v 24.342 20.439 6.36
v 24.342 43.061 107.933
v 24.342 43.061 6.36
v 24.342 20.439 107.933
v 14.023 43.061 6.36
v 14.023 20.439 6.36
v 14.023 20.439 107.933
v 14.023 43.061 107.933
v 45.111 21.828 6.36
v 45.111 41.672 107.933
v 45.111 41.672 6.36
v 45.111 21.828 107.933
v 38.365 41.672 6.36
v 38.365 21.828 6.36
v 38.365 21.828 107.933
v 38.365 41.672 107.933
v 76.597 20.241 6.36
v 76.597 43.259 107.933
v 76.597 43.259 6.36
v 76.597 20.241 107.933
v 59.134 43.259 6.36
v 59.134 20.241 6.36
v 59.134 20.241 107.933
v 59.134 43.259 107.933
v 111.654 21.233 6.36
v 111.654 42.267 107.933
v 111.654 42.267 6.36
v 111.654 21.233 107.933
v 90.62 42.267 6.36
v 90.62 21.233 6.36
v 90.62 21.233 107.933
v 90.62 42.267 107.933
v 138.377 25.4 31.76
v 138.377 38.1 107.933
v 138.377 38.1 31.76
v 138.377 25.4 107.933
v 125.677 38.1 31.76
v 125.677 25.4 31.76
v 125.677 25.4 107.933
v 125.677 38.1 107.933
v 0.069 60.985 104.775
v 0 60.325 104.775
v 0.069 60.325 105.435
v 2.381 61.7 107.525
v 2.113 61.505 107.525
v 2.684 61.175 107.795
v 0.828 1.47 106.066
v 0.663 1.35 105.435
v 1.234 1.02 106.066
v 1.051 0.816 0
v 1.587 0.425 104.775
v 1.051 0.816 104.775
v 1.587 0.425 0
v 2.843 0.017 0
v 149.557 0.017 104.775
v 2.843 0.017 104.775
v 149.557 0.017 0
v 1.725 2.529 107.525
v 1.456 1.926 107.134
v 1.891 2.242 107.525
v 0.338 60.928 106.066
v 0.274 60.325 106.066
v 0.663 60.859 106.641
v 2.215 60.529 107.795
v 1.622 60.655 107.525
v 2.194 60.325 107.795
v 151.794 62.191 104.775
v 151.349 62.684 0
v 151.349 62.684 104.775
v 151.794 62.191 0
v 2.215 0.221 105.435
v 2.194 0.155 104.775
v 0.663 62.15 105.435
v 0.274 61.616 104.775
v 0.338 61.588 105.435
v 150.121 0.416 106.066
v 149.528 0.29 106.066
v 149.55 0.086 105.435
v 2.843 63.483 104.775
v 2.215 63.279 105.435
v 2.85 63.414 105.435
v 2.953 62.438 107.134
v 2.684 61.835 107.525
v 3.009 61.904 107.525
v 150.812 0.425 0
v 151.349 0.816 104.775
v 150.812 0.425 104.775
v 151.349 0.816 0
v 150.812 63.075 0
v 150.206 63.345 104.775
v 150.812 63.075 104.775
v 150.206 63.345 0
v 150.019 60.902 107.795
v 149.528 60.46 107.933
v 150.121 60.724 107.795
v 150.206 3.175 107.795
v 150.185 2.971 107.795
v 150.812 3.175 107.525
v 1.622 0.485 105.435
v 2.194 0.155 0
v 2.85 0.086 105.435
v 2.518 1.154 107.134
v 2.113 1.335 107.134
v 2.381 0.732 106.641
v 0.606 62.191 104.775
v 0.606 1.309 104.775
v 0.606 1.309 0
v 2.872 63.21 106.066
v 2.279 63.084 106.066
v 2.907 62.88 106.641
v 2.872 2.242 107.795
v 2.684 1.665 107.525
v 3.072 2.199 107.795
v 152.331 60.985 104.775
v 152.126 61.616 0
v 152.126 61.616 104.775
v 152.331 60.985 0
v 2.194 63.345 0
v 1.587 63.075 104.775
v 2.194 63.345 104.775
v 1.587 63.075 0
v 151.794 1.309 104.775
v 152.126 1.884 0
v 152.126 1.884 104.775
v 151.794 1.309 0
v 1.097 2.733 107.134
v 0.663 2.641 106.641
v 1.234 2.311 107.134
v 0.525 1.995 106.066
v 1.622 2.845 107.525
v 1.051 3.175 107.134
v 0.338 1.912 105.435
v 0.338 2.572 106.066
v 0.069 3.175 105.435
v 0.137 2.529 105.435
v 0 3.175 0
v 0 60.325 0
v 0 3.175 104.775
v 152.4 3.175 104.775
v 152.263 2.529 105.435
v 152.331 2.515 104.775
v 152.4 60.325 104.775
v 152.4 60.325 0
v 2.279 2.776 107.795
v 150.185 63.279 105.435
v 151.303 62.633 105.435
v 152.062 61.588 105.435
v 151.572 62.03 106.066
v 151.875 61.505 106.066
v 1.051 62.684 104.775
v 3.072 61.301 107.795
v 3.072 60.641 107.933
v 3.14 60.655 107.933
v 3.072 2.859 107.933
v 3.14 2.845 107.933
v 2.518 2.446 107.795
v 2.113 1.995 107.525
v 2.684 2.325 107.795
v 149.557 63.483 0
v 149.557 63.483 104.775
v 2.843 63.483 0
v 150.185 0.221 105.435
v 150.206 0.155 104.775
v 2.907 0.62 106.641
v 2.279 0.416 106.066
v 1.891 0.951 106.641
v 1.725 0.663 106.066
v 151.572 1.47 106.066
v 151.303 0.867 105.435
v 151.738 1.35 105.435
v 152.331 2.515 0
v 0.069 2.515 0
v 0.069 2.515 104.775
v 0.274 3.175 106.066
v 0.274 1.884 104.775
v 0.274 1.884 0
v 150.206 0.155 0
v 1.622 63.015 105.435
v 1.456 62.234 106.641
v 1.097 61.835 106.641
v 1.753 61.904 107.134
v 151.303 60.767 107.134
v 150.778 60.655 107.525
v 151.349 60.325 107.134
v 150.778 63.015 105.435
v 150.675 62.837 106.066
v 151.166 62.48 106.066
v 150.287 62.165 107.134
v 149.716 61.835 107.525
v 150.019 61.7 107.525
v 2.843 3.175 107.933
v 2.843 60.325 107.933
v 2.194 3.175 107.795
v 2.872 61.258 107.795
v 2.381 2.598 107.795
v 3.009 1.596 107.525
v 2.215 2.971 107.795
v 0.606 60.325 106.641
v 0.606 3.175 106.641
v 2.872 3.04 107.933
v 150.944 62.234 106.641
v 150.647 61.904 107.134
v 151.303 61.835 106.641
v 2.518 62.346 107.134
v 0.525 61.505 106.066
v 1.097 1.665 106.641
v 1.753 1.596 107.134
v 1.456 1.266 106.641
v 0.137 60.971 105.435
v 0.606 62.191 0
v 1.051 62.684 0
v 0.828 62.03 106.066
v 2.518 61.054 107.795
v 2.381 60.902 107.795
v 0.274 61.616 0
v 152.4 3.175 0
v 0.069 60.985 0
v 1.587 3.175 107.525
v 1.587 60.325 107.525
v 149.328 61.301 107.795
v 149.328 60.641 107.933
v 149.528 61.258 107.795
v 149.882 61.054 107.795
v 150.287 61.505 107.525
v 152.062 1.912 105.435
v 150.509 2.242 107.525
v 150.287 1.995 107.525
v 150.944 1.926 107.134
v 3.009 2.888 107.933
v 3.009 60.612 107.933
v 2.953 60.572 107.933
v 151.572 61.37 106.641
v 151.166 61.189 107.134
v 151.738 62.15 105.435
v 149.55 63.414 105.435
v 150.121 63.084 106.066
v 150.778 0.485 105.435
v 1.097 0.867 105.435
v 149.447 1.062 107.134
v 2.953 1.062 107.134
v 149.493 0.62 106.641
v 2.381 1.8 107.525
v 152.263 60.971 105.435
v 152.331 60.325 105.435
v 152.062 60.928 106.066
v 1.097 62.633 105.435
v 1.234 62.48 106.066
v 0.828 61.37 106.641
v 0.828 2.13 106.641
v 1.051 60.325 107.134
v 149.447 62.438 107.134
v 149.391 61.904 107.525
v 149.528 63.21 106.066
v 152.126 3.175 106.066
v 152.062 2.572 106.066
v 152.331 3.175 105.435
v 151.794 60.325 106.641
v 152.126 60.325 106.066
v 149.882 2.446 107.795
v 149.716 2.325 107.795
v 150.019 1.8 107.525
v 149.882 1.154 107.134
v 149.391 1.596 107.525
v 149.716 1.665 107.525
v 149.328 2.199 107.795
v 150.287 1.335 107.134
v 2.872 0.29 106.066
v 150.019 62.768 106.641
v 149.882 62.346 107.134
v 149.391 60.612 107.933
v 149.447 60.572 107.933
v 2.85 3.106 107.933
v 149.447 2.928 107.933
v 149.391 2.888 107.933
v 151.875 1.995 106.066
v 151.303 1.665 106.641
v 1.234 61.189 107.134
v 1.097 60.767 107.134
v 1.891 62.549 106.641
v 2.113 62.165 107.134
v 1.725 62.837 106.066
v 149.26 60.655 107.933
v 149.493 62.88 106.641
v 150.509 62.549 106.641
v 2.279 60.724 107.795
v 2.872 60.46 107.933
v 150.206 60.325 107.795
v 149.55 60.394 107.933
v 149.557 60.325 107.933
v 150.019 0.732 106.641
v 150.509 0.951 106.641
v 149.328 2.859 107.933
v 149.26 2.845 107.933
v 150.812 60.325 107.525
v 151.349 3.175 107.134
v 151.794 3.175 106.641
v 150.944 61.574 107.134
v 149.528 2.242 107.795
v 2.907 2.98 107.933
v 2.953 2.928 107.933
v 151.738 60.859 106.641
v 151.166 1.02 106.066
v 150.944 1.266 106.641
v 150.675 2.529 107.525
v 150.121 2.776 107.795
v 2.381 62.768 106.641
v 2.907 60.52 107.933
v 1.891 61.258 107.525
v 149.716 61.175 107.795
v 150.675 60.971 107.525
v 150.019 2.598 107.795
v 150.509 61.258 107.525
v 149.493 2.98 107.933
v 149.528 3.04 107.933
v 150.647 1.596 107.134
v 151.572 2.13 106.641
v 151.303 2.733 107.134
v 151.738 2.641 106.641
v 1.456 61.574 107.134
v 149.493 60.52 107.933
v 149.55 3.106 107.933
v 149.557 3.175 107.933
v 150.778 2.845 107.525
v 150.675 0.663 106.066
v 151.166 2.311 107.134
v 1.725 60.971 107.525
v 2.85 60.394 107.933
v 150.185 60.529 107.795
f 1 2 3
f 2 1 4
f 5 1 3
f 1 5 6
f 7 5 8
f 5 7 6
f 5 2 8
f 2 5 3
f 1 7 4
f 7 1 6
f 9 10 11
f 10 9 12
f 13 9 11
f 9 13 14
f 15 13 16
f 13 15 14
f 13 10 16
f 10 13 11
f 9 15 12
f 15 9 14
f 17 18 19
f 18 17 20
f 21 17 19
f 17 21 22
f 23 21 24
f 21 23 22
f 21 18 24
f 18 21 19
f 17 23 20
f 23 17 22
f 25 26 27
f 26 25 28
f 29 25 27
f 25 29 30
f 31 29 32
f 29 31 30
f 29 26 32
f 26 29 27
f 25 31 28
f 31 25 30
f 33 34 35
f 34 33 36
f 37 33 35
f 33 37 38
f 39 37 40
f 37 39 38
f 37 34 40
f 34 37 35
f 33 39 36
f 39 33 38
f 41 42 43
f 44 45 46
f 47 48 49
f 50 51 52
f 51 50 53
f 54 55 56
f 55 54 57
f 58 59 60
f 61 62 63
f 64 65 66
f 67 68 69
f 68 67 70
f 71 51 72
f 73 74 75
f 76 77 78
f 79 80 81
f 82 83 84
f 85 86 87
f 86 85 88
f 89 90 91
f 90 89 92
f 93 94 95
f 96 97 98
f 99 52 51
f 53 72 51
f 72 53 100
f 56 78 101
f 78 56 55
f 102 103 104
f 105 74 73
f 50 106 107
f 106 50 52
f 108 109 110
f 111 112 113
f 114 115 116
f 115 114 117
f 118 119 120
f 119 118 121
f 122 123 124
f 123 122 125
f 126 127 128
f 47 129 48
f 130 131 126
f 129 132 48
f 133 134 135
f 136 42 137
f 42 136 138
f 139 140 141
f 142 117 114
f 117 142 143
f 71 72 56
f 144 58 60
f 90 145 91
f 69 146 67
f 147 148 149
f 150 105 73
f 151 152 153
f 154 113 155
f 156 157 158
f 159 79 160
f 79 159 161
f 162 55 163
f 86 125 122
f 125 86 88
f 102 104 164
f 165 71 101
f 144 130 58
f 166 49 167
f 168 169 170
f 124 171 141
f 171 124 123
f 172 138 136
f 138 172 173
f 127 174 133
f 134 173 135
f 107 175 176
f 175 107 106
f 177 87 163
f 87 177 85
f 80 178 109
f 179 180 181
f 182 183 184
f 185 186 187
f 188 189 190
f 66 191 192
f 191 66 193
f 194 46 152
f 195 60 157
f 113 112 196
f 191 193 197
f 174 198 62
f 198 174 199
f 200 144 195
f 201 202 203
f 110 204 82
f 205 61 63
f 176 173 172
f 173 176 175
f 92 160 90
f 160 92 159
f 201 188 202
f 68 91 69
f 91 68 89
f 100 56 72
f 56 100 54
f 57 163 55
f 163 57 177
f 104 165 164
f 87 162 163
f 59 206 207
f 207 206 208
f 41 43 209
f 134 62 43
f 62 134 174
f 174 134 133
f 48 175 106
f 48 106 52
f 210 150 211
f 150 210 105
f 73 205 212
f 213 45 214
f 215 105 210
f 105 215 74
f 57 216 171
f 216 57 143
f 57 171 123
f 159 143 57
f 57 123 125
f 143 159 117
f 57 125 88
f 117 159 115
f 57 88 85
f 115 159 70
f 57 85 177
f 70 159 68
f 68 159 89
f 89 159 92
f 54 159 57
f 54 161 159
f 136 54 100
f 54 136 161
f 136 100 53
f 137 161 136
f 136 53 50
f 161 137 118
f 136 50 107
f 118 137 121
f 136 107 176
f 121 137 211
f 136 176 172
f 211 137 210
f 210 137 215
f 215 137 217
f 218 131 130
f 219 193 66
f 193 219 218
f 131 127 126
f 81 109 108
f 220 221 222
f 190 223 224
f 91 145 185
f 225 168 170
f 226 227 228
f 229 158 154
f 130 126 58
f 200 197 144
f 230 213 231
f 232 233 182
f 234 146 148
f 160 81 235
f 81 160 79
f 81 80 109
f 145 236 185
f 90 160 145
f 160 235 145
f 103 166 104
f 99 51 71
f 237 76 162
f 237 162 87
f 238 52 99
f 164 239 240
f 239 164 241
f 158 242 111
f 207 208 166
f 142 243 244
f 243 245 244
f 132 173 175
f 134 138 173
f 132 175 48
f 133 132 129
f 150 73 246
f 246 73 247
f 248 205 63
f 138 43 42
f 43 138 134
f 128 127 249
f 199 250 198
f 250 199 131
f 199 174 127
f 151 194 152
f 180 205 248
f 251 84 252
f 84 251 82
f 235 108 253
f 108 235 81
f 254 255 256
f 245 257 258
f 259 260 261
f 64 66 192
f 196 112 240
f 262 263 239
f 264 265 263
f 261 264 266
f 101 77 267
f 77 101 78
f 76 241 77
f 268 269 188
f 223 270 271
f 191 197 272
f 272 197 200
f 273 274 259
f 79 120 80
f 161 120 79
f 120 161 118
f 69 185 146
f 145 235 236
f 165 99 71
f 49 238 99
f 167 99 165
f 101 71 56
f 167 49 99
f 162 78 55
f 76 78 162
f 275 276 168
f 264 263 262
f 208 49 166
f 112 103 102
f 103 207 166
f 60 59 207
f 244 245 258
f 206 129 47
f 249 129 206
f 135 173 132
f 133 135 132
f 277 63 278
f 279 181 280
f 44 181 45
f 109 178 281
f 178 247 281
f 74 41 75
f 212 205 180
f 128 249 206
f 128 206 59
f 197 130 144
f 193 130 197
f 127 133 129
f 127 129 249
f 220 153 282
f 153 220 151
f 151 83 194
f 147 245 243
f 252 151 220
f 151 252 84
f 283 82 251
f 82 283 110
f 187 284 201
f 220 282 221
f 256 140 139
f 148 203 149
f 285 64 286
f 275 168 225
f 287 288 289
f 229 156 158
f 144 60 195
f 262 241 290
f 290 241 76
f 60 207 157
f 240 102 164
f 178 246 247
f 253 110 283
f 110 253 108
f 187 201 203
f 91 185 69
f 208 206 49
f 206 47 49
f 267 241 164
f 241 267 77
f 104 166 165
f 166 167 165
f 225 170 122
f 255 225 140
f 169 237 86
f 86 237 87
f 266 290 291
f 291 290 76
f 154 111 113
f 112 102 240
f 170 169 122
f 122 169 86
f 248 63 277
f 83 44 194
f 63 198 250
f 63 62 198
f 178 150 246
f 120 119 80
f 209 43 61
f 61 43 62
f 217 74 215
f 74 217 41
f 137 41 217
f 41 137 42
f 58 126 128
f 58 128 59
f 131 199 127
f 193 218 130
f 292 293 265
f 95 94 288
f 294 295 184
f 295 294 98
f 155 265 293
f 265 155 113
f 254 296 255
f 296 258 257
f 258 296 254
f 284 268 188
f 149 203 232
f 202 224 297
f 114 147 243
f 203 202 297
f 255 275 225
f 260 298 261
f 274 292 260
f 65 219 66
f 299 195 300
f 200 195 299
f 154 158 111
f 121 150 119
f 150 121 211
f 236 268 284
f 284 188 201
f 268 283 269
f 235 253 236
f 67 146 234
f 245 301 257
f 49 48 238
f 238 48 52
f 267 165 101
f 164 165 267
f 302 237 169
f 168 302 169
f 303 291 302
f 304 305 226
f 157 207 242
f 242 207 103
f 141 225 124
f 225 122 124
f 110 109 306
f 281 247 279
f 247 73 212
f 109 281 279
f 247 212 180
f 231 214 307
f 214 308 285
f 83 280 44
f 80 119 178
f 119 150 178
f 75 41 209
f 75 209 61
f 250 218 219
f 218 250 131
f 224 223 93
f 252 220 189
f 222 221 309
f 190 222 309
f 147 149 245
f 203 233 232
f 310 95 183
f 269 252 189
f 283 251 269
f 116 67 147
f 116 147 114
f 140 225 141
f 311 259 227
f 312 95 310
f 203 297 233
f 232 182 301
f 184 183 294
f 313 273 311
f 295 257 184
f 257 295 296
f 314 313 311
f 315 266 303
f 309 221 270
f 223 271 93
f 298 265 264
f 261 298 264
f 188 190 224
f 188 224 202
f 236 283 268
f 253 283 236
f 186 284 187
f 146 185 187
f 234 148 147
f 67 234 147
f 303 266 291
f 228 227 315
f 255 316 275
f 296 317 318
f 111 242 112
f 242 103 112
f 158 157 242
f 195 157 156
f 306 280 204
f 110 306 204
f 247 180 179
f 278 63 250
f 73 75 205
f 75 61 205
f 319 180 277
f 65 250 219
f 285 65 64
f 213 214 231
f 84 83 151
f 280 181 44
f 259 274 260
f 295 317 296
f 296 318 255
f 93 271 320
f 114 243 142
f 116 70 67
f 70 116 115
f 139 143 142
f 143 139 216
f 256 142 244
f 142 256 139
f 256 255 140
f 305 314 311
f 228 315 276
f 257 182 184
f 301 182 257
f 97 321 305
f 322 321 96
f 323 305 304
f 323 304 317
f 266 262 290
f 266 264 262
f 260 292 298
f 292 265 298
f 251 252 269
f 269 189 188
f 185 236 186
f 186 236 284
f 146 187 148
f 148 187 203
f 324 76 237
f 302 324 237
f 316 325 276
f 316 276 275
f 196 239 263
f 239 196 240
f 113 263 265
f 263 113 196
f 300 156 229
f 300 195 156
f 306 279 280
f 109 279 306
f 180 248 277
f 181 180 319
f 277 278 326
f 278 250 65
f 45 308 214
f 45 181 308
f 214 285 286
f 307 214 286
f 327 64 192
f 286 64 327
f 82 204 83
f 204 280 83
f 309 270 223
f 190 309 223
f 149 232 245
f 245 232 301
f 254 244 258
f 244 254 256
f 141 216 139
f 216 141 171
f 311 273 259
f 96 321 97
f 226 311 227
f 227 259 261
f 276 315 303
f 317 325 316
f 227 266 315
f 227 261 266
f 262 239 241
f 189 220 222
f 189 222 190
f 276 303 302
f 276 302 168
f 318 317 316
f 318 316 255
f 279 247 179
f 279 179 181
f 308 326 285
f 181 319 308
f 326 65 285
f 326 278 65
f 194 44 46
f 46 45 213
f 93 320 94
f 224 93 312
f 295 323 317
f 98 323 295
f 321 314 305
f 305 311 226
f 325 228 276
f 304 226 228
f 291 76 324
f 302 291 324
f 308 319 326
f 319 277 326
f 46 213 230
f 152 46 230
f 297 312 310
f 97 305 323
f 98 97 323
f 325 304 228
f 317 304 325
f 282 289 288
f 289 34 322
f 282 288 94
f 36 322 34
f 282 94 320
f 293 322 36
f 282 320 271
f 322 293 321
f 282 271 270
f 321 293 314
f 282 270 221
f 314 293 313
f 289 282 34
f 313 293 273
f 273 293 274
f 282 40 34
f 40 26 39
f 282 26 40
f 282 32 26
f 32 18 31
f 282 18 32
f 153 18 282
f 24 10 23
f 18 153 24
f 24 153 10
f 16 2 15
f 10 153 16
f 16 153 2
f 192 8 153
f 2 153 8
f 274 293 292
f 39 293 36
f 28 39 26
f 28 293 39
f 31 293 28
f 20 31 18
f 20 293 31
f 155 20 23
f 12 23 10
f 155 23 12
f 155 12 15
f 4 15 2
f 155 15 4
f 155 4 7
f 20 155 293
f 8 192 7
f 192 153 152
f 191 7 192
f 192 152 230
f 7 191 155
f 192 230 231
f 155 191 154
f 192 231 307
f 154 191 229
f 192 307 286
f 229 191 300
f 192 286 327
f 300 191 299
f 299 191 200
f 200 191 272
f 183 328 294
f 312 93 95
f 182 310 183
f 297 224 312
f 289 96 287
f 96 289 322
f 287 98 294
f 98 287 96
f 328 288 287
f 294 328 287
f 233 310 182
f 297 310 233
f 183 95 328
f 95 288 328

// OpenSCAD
// file: rounded_corners.scad
// Higher definition curves
$fs = 0.01;

module roundedcube(size = [1, 1, 1], center = false, radius = 0.5, apply_to = "all") {
  // If single value, convert to [x, y, z] vector
  size = (size[0] == undef) ? [size, size, size] : size;

  translate_min = radius;
  translate_xmax = size[0] - radius;
  translate_ymax = size[1] - radius;
  translate_zmax = size[2] - radius;

  diameter = radius * 2;

  module build_point(type = "sphere", rotate = [0, 0, 0]) {
    if (type == "sphere") {
      sphere(r = radius);
    } else if (type == "cylinder") {
      rotate(a = rotate)
      cylinder(h = diameter, r = radius, center = true);
    }
  }

  obj_translate = (center == false) ?
    [0, 0, 0] : [
      -(size[0] / 2),
      -(size[1] / 2),
      -(size[2] / 2)
    ];

  translate(v = obj_translate) {
    hull() {
      for (translate_x = [translate_min, translate_xmax]) {
        x_at = (translate_x == translate_min) ? "min" : "max";
        for (translate_y = [translate_min, translate_ymax]) {
          y_at = (translate_y == translate_min) ? "min" : "max";
          for (translate_z = [translate_min, translate_zmax]) {
            z_at = (translate_z == translate_min) ? "min" : "max";

            translate(v = [translate_x, translate_y, translate_z])
            if (
              (apply_to == "all") ||
              (apply_to == "xmin" && x_at == "min") || (apply_to == "xmax" && x_at == "max") ||
              (apply_to == "ymin" && y_at == "min") || (apply_to == "ymax" && y_at == "max") ||
              (apply_to == "zmin" && z_at == "min") || (apply_to == "zmax" && z_at == "max")
            ) {
              build_point("sphere");
            } else {
              rotate =
                (apply_to == "xmin" || apply_to == "xmax" || apply_to == "x") ? [0, 90, 0] : (
                (apply_to == "ymin" || apply_to == "ymax" || apply_to == "y") ? [90, 90, 0] :
                [0, 0, 0]
              );
              build_point("cylinder", rotate);
            }
          }
        }
      }
    }
  }
}
// main file
include <rounded_corners.scad>

function in2mm (v) = v * 25.4;
function sumx (v, i, s = 0) = (i == s ? v [i][0] : v [i][0] + sumx (v, i - 1, s));

bw      = in2mm (6.0);   // Width of box
bd      = in2mm (2.5);   // Depth of box
bh      = in2mm (4.25);  // Height of box
margin  = in2mm (0.25);  // Minimum distance from hole to edge of box

scissors_1   = [in2mm ((1 / 64) * 26), in2mm ((1 / 64) * 57), in2mm (4.0)];
scissors_2   = [in2mm ((1 / 64) * 17), in2mm ((1 / 64) * 50), in2mm (4.0)];
brush        = [in2mm ((1 / 64) * 44), in2mm ((1 / 64) * 58), in2mm (4.0)];
desolder     = [in2mm ((1 / 64) * 53), in2mm ((1 / 64) * 53), in2mm (4.0)];
screwdriver  = [in2mm ((1 / 16) *  8), in2mm ((1 / 16) *  8), in2mm (3.0)];

holes_table = [scissors_1, scissors_2, brush, desolder, screwdriver ];

spacing = (bw - sumx (holes_table, len (holes_table) - 1)) / (len (holes_table) + 1);

loc_table = [[(spacing *  1) + 0,                     (bd - holes_table [0][1]) / 2, (bh - holes_table [0][2]) + 0.01], //  0
             [(spacing *  2) + sumx (holes_table, 0), (bd - holes_table [1][1]) / 2, (bh - holes_table [1][2]) + 0.01], //  0 + 3
             [(spacing *  3) + sumx (holes_table, 1), (bd - holes_table [2][1]) / 2, (bh - holes_table [2][2]) + 0.01], //  3 + 3
             [(spacing *  4) + sumx (holes_table, 2), (bd - holes_table [3][1]) / 2, (bh - holes_table [3][2]) + 0.01], //  6 + 8
             [(spacing *  5) + sumx (holes_table, 3), (bd - holes_table [4][1]) / 2, (bh - holes_table [4][2]) + 0.01],
            ];

difference () {
  roundedcube ([bw, bd, bh], radius = in2mm (0.125), apply_to="zmax");

  for (i = [0 : len (holes_table) - 1]) {
    translate (loc_table [i])
      cube (holes_table [i]);
  }
}
